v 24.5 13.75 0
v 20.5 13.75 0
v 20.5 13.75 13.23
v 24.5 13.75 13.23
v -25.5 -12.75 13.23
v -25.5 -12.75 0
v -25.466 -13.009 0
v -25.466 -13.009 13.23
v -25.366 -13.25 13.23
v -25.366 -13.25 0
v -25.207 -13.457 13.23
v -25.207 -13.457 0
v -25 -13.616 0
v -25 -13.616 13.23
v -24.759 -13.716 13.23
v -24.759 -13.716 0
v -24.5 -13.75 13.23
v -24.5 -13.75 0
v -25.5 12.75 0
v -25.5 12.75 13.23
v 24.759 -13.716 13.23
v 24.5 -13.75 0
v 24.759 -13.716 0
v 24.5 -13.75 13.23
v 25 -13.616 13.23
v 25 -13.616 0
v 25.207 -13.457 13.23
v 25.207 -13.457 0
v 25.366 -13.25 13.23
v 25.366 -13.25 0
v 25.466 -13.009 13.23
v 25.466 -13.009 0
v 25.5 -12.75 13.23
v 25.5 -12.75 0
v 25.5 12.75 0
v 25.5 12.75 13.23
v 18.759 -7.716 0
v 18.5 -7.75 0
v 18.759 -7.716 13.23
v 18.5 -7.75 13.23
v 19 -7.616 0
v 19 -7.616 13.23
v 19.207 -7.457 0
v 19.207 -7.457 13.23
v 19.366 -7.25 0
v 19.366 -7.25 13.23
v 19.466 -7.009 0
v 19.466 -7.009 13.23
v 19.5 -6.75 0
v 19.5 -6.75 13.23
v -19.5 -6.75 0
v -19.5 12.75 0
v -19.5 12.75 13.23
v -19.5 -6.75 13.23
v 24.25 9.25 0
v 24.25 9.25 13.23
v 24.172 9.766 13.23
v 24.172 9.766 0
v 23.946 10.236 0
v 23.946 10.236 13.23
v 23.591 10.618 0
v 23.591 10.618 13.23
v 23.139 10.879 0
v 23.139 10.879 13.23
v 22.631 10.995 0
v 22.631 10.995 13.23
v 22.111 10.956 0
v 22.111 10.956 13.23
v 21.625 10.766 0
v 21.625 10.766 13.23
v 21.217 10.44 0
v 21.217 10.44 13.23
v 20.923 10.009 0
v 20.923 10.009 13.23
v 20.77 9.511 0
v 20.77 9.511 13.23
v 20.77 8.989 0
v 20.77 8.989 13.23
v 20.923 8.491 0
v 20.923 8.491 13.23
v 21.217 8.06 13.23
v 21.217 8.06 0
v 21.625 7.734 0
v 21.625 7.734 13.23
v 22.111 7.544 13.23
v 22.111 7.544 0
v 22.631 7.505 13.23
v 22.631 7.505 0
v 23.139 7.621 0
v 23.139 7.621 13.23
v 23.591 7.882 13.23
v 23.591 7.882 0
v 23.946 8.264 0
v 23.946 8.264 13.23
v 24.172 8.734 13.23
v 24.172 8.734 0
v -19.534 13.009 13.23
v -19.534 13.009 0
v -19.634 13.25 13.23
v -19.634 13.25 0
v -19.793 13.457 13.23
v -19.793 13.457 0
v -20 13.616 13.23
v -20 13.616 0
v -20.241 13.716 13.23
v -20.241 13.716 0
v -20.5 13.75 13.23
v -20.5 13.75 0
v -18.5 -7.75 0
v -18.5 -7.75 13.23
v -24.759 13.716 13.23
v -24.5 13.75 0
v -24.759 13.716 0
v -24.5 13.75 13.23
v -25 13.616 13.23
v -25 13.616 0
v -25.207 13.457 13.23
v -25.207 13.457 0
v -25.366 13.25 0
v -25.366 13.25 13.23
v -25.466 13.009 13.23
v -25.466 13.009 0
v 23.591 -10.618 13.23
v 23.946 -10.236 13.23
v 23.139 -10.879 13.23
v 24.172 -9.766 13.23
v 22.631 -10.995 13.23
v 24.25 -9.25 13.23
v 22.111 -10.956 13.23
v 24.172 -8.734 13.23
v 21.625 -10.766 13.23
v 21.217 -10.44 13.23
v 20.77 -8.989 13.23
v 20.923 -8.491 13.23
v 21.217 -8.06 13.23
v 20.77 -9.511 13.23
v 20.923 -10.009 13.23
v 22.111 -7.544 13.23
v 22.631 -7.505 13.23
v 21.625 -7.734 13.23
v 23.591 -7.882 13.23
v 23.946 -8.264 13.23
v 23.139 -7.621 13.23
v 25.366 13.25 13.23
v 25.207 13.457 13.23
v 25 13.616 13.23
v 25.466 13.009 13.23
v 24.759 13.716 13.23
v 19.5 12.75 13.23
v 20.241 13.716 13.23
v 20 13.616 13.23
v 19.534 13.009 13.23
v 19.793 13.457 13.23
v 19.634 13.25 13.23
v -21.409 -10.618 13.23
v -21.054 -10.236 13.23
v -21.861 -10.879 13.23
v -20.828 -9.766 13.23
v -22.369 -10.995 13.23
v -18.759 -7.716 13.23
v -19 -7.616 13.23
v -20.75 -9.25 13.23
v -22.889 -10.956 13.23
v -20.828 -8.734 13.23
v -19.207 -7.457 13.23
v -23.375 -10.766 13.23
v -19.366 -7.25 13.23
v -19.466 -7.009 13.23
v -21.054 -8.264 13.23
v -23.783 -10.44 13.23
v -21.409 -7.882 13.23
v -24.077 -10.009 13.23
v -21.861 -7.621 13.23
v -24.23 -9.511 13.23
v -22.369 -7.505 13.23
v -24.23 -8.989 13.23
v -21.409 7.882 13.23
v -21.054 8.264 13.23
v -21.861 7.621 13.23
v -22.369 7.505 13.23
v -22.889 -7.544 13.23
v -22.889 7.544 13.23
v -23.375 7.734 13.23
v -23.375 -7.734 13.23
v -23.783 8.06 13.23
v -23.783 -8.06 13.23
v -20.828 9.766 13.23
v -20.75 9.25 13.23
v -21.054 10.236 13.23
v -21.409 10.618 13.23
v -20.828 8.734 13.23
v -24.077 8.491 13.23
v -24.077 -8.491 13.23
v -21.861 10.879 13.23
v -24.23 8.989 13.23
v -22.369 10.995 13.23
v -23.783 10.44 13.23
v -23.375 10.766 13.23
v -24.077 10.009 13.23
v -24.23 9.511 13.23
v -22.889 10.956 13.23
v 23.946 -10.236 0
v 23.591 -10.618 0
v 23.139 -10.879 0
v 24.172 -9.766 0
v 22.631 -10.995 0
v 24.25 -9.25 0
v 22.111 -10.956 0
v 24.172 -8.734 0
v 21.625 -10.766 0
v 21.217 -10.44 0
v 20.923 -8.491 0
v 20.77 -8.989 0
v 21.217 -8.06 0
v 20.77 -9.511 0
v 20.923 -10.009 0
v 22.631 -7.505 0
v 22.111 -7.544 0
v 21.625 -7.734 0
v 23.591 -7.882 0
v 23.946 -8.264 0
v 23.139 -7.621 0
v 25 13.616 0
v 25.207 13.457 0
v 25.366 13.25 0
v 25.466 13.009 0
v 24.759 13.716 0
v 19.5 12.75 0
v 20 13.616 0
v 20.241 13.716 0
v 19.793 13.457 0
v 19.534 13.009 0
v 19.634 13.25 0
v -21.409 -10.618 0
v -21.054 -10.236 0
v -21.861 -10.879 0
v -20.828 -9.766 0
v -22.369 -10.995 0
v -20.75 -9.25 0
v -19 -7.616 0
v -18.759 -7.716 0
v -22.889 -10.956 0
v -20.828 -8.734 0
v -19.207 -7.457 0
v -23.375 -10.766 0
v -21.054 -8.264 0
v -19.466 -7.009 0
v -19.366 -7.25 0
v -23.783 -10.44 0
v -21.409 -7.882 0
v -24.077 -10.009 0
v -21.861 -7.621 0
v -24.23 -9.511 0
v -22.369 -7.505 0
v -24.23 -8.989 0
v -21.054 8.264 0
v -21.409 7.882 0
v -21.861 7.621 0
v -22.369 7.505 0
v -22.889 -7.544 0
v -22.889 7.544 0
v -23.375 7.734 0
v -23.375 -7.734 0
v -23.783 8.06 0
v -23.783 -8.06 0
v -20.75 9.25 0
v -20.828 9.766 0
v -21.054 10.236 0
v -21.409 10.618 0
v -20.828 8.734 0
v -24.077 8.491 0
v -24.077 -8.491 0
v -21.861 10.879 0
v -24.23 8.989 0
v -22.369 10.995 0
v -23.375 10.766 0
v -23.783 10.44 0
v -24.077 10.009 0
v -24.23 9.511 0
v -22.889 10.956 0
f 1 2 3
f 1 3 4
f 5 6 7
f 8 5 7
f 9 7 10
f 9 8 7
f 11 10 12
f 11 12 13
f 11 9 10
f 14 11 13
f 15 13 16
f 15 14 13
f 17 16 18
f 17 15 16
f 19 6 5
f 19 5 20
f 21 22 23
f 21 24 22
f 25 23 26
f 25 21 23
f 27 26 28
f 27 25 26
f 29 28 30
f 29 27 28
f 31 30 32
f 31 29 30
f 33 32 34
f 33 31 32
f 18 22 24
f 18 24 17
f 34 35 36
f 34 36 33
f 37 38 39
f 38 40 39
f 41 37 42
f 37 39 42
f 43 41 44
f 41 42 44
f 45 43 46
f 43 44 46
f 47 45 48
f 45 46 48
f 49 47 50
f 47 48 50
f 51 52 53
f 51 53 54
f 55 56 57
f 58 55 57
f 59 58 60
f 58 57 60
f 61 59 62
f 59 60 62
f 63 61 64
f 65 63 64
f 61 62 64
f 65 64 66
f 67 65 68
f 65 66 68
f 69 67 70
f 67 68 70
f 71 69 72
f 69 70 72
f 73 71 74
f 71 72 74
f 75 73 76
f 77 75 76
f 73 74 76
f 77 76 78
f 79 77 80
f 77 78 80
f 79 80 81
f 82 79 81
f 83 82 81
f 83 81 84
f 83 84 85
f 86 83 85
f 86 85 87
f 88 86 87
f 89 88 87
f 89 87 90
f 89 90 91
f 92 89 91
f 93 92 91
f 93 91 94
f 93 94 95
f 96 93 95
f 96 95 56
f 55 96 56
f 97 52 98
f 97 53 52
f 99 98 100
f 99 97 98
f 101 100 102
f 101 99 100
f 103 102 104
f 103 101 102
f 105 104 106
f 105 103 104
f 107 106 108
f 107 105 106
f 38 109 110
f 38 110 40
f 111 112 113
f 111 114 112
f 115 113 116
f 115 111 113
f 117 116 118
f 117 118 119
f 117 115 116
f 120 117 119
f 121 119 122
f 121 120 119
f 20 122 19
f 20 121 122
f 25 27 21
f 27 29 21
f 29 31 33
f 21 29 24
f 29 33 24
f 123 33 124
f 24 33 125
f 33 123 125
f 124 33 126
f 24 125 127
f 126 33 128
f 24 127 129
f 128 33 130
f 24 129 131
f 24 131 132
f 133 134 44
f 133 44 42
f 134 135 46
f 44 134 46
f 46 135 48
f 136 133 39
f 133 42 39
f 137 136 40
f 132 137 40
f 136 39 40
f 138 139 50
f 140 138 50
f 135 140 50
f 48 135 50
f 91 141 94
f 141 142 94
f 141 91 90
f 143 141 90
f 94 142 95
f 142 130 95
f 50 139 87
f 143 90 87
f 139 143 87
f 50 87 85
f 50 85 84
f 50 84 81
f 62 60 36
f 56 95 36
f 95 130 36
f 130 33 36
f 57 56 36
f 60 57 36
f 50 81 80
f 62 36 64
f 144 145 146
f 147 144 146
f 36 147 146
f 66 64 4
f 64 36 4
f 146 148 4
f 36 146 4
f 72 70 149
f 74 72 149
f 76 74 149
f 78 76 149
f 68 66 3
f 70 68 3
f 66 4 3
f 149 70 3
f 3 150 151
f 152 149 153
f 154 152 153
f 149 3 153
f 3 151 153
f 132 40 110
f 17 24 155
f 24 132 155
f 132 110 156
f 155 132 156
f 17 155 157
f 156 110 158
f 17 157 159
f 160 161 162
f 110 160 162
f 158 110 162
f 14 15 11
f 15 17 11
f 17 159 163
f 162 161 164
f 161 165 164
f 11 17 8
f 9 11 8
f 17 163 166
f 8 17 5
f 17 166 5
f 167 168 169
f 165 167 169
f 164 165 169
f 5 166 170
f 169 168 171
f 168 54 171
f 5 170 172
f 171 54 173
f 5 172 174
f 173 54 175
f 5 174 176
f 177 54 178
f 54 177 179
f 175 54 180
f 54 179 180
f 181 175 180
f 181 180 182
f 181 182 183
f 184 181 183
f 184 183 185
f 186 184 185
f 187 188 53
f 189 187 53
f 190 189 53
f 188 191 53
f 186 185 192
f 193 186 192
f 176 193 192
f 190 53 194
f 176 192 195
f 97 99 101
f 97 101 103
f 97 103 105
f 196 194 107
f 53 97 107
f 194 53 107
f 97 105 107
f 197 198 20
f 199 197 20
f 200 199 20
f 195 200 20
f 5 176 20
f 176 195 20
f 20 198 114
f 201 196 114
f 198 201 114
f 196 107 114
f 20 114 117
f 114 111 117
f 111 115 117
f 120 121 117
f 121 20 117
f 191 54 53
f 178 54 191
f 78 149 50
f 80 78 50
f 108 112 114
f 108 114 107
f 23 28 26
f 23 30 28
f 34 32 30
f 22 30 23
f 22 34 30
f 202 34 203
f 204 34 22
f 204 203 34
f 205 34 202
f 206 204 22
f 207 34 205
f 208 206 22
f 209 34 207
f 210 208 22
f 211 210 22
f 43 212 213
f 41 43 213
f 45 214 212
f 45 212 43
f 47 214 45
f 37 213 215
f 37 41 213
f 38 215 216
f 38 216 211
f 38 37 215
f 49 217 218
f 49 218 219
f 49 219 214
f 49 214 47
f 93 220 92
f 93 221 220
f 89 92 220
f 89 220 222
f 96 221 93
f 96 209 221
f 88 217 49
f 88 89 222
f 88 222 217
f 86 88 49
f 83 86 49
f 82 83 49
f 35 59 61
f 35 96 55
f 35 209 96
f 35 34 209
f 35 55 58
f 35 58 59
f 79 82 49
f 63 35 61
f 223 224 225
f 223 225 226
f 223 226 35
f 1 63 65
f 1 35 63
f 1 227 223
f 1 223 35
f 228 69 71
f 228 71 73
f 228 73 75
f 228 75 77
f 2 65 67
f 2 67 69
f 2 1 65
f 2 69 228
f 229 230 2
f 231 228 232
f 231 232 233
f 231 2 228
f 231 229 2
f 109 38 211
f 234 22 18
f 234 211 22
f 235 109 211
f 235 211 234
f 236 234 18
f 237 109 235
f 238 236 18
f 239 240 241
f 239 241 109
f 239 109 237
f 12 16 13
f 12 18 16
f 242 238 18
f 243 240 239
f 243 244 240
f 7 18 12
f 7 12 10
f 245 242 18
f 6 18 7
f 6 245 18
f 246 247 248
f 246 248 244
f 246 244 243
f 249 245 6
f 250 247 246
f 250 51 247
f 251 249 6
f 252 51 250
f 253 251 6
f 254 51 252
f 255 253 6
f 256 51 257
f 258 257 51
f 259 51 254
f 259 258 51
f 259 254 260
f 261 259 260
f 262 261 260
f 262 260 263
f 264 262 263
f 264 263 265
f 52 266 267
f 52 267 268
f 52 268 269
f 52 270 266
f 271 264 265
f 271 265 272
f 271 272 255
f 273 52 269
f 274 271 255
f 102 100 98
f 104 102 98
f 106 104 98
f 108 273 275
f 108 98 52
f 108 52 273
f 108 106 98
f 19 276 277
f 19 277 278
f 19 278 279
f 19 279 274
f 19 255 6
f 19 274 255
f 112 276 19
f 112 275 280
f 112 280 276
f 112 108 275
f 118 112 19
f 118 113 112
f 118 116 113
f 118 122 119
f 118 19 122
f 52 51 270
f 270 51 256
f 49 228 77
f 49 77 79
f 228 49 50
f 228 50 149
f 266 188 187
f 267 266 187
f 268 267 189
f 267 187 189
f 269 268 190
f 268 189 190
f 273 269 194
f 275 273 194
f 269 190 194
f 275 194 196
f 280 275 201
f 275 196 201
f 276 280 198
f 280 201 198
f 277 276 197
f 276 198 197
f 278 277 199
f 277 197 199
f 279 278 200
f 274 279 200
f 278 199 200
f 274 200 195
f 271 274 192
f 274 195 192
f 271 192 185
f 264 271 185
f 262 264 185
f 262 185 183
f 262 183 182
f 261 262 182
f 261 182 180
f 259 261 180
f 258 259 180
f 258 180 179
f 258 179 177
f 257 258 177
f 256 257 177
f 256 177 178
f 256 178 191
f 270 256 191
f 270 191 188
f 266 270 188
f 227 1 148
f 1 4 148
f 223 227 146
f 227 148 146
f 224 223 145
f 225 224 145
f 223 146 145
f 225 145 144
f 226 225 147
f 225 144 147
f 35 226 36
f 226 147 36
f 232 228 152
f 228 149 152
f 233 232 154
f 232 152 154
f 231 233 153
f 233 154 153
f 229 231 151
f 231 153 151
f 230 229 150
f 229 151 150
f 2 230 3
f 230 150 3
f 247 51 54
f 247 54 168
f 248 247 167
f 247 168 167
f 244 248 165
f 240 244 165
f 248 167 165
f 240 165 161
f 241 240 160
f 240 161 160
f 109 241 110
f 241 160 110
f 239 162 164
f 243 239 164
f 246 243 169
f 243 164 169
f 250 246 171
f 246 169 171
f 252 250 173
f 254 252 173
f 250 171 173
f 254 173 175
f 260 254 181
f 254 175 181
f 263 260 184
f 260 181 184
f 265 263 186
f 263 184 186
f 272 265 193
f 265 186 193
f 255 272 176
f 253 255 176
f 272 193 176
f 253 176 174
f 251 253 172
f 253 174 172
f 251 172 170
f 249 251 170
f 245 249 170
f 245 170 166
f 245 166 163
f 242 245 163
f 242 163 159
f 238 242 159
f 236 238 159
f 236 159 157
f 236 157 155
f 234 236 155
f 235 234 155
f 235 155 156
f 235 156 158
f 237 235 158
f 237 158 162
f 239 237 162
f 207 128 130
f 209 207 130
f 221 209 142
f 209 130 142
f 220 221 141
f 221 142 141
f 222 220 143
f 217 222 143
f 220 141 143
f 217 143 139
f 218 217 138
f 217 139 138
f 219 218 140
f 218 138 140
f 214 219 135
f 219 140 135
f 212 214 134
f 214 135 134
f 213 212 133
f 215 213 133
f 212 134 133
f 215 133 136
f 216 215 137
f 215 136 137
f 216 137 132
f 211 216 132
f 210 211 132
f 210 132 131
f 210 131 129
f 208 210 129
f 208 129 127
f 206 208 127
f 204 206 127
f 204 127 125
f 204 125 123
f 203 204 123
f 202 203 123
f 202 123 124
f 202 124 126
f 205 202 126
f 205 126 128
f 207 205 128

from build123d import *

# Parameters (mm, degrees)
EXTRUDE_1_DEPTH     = 13.23
SKETCH_3_R          = 1.75
CUT_EXTRUDE_2_DEPTH = 32.848789616
FILLET_1_R          = 1


with BuildPart() as part:
    # 草图1 → 凸台-拉伸1 (new body)
    with BuildSketch(Plane.XY):
        Polygon((-19.5, 13.75), (-19.5, -7.75), (19.5, -7.75), (19.5, 13.75), (25.5, 13.75), (25.5, -13.75), (-25.5, -13.75), (-25.5, 13.75), align=None)
    extrude(amount=EXTRUDE_1_DEPTH)

    # 草图3 → 切除-拉伸2 (cut, through all)
    with BuildSketch(Plane.XY.offset(13.23)):
        with Locations((-22.5, 9.25)):
            Circle(SKETCH_3_R)
        with Locations((-22.5, -9.25)):
            Circle(SKETCH_3_R)
        with Locations((22.5, -9.25)):
            Circle(SKETCH_3_R)
        with Locations((22.5, 9.25)):
            Circle(SKETCH_3_R)
    extrude(amount=-CUT_EXTRUDE_2_DEPTH, mode=Mode.SUBTRACT)

    # 圆角1
    fillet_1_edges = [part.edges().sort_by_distance(p)[0] for p in [
        (25.5, -13.75, 6.615),
        (-25.5, -13.75, 6.615),
        (-25.5, 13.75, 6.615),
        (-19.5, 13.75, 6.615),
        (-19.5, -7.75, 6.615),
        (19.5, -7.75, 6.615),
        (19.5, 13.75, 6.615),
        (25.5, 13.75, 6.615),
    ]]
    fillet(fillet_1_edges, radius=FILLET_1_R)


solid = part.part
